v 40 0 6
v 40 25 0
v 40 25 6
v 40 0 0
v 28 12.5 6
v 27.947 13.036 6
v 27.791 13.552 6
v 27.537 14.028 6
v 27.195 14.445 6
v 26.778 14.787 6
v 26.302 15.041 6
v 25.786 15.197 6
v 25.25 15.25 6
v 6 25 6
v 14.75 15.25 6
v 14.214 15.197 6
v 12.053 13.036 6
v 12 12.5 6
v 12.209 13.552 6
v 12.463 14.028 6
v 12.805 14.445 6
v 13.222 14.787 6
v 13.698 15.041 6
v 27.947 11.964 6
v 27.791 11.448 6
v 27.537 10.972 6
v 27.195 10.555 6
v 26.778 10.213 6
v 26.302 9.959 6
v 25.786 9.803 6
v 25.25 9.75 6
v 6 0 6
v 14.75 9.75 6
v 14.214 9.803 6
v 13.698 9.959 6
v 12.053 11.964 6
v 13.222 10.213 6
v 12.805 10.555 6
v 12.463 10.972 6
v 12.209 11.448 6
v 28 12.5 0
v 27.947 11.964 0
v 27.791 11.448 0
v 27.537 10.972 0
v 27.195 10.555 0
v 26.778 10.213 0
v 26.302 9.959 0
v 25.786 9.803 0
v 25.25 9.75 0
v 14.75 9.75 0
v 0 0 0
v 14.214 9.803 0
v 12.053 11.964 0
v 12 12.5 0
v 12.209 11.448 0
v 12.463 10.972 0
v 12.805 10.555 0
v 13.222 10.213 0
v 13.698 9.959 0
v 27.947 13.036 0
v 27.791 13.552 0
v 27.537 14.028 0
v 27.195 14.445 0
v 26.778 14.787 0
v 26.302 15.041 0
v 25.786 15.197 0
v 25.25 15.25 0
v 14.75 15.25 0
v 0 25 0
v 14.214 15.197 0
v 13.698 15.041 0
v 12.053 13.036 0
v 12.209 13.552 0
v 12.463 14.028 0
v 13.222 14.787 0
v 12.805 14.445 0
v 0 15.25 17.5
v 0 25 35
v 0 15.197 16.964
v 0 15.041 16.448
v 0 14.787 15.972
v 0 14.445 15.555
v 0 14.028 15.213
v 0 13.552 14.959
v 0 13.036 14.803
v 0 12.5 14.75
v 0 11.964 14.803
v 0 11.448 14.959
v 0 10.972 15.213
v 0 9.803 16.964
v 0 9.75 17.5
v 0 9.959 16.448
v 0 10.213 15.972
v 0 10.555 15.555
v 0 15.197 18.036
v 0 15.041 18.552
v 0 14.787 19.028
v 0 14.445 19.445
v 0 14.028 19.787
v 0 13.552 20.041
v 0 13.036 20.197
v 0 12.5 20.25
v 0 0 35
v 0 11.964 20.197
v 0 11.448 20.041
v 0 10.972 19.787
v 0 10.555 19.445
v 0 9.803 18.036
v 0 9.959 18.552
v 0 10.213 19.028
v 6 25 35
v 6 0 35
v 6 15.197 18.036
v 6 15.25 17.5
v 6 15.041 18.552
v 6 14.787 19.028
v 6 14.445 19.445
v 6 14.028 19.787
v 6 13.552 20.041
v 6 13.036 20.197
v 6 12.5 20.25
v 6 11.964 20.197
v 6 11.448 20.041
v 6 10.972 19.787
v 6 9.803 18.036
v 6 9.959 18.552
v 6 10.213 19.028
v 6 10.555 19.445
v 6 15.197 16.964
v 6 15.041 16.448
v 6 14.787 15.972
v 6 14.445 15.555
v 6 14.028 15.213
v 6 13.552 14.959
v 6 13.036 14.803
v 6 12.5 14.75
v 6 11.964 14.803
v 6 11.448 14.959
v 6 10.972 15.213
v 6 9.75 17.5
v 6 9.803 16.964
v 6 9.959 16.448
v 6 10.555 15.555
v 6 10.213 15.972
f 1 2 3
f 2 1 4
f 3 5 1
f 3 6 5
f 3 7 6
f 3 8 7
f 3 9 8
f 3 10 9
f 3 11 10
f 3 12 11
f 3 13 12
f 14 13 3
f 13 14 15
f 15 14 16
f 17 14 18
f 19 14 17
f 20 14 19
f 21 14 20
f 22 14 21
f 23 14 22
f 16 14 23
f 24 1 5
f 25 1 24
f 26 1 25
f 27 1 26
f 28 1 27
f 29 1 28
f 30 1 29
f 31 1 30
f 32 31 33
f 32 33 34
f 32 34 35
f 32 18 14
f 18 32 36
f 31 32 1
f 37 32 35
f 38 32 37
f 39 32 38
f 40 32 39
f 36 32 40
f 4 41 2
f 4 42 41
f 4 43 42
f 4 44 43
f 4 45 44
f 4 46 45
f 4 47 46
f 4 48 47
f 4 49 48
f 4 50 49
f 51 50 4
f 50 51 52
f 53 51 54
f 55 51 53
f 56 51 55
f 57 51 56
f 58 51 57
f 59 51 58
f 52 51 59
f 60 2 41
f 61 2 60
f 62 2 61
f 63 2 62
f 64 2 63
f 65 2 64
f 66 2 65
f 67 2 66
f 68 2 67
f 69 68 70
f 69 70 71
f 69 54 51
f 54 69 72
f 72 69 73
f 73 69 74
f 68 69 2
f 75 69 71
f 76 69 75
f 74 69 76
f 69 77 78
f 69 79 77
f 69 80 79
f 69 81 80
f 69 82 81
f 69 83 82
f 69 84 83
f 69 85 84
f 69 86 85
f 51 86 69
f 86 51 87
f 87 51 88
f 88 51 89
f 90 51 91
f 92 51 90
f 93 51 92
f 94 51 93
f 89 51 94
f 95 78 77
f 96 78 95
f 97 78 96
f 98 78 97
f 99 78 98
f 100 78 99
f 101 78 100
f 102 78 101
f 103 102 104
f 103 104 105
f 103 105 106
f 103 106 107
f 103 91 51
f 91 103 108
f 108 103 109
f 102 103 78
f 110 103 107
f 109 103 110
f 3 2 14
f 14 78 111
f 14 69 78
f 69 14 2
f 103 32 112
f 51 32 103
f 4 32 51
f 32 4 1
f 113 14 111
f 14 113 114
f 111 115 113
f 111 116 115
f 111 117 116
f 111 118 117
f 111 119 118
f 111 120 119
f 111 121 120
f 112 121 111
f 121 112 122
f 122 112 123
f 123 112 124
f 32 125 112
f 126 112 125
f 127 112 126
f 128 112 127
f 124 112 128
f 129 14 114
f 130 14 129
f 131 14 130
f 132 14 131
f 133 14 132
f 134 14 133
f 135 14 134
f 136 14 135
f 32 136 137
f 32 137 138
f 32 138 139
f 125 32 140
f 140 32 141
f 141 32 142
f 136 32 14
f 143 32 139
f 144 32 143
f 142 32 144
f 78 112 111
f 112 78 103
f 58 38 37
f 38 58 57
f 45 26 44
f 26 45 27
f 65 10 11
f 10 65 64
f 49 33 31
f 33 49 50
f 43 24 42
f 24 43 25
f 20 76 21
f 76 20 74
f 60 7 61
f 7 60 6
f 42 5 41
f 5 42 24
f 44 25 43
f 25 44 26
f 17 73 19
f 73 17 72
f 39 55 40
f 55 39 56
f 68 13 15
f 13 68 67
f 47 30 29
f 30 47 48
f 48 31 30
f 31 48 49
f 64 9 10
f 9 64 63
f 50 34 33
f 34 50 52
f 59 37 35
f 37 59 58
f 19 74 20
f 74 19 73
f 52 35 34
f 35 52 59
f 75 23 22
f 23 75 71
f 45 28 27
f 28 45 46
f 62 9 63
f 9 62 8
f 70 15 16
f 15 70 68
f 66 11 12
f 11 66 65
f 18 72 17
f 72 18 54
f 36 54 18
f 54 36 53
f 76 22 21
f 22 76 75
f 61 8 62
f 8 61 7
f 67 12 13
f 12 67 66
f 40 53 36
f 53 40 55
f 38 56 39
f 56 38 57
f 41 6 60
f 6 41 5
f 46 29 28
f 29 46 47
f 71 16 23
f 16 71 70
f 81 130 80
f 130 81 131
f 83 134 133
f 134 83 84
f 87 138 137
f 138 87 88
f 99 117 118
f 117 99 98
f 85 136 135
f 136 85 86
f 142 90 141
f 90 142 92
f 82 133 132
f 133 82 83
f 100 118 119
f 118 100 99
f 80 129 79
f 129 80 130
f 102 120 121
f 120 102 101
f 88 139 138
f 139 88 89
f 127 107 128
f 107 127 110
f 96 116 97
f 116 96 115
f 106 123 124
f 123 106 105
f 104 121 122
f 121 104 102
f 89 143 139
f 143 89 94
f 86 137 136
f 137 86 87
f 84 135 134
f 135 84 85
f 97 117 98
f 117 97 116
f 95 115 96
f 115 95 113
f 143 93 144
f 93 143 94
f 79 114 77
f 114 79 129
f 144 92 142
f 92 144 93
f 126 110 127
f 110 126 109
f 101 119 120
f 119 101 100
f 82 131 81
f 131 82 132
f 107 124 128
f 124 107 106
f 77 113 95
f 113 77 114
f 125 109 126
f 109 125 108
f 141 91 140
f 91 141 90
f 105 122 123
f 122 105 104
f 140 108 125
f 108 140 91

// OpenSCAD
$fn = 32;

// ----------------------------------------------------------------------
// L-bracket: 40 x 25 x 35 mm
// ----------------------------------------------------------------------

// --- parameters (mm) ---
run_out = 40;             // horizontal leg, X
rise = 35;                // vertical leg, Z
bracket_w = 25;           // bracket depth, Y
sheet_t = 6;              // plate thickness
hole_d = 5.5;             // clearance for M5
slot_l = 16;              // adjustment slot length

module hole_z(px, py) {
  translate([px, py, -0.5]) cylinder(h = sheet_t + 1, d = hole_d);
}
module hole_x(pz, py) {
  translate([-0.5, py, pz]) rotate([0, 90, 0]) cylinder(h = sheet_t + 1, d = hole_d);
}
module adjust_slot(px, py) {
  hull() {
    translate([px - (slot_l - hole_d) / 2, py, -0.5]) cylinder(h = sheet_t + 1, d = hole_d);
    translate([px + (slot_l - hole_d) / 2, py, -0.5]) cylinder(h = sheet_t + 1, d = hole_d);
  }
}

difference() {
  union() {
    /* horizontal leg */
    cube([run_out, bracket_w, sheet_t]);
    /* vertical leg, overlapping the corner block */
    cube([sheet_t, bracket_w, rise]);
  }
  adjust_slot(20, 12.5);
  hole_x(17.5, 12.5);
}
